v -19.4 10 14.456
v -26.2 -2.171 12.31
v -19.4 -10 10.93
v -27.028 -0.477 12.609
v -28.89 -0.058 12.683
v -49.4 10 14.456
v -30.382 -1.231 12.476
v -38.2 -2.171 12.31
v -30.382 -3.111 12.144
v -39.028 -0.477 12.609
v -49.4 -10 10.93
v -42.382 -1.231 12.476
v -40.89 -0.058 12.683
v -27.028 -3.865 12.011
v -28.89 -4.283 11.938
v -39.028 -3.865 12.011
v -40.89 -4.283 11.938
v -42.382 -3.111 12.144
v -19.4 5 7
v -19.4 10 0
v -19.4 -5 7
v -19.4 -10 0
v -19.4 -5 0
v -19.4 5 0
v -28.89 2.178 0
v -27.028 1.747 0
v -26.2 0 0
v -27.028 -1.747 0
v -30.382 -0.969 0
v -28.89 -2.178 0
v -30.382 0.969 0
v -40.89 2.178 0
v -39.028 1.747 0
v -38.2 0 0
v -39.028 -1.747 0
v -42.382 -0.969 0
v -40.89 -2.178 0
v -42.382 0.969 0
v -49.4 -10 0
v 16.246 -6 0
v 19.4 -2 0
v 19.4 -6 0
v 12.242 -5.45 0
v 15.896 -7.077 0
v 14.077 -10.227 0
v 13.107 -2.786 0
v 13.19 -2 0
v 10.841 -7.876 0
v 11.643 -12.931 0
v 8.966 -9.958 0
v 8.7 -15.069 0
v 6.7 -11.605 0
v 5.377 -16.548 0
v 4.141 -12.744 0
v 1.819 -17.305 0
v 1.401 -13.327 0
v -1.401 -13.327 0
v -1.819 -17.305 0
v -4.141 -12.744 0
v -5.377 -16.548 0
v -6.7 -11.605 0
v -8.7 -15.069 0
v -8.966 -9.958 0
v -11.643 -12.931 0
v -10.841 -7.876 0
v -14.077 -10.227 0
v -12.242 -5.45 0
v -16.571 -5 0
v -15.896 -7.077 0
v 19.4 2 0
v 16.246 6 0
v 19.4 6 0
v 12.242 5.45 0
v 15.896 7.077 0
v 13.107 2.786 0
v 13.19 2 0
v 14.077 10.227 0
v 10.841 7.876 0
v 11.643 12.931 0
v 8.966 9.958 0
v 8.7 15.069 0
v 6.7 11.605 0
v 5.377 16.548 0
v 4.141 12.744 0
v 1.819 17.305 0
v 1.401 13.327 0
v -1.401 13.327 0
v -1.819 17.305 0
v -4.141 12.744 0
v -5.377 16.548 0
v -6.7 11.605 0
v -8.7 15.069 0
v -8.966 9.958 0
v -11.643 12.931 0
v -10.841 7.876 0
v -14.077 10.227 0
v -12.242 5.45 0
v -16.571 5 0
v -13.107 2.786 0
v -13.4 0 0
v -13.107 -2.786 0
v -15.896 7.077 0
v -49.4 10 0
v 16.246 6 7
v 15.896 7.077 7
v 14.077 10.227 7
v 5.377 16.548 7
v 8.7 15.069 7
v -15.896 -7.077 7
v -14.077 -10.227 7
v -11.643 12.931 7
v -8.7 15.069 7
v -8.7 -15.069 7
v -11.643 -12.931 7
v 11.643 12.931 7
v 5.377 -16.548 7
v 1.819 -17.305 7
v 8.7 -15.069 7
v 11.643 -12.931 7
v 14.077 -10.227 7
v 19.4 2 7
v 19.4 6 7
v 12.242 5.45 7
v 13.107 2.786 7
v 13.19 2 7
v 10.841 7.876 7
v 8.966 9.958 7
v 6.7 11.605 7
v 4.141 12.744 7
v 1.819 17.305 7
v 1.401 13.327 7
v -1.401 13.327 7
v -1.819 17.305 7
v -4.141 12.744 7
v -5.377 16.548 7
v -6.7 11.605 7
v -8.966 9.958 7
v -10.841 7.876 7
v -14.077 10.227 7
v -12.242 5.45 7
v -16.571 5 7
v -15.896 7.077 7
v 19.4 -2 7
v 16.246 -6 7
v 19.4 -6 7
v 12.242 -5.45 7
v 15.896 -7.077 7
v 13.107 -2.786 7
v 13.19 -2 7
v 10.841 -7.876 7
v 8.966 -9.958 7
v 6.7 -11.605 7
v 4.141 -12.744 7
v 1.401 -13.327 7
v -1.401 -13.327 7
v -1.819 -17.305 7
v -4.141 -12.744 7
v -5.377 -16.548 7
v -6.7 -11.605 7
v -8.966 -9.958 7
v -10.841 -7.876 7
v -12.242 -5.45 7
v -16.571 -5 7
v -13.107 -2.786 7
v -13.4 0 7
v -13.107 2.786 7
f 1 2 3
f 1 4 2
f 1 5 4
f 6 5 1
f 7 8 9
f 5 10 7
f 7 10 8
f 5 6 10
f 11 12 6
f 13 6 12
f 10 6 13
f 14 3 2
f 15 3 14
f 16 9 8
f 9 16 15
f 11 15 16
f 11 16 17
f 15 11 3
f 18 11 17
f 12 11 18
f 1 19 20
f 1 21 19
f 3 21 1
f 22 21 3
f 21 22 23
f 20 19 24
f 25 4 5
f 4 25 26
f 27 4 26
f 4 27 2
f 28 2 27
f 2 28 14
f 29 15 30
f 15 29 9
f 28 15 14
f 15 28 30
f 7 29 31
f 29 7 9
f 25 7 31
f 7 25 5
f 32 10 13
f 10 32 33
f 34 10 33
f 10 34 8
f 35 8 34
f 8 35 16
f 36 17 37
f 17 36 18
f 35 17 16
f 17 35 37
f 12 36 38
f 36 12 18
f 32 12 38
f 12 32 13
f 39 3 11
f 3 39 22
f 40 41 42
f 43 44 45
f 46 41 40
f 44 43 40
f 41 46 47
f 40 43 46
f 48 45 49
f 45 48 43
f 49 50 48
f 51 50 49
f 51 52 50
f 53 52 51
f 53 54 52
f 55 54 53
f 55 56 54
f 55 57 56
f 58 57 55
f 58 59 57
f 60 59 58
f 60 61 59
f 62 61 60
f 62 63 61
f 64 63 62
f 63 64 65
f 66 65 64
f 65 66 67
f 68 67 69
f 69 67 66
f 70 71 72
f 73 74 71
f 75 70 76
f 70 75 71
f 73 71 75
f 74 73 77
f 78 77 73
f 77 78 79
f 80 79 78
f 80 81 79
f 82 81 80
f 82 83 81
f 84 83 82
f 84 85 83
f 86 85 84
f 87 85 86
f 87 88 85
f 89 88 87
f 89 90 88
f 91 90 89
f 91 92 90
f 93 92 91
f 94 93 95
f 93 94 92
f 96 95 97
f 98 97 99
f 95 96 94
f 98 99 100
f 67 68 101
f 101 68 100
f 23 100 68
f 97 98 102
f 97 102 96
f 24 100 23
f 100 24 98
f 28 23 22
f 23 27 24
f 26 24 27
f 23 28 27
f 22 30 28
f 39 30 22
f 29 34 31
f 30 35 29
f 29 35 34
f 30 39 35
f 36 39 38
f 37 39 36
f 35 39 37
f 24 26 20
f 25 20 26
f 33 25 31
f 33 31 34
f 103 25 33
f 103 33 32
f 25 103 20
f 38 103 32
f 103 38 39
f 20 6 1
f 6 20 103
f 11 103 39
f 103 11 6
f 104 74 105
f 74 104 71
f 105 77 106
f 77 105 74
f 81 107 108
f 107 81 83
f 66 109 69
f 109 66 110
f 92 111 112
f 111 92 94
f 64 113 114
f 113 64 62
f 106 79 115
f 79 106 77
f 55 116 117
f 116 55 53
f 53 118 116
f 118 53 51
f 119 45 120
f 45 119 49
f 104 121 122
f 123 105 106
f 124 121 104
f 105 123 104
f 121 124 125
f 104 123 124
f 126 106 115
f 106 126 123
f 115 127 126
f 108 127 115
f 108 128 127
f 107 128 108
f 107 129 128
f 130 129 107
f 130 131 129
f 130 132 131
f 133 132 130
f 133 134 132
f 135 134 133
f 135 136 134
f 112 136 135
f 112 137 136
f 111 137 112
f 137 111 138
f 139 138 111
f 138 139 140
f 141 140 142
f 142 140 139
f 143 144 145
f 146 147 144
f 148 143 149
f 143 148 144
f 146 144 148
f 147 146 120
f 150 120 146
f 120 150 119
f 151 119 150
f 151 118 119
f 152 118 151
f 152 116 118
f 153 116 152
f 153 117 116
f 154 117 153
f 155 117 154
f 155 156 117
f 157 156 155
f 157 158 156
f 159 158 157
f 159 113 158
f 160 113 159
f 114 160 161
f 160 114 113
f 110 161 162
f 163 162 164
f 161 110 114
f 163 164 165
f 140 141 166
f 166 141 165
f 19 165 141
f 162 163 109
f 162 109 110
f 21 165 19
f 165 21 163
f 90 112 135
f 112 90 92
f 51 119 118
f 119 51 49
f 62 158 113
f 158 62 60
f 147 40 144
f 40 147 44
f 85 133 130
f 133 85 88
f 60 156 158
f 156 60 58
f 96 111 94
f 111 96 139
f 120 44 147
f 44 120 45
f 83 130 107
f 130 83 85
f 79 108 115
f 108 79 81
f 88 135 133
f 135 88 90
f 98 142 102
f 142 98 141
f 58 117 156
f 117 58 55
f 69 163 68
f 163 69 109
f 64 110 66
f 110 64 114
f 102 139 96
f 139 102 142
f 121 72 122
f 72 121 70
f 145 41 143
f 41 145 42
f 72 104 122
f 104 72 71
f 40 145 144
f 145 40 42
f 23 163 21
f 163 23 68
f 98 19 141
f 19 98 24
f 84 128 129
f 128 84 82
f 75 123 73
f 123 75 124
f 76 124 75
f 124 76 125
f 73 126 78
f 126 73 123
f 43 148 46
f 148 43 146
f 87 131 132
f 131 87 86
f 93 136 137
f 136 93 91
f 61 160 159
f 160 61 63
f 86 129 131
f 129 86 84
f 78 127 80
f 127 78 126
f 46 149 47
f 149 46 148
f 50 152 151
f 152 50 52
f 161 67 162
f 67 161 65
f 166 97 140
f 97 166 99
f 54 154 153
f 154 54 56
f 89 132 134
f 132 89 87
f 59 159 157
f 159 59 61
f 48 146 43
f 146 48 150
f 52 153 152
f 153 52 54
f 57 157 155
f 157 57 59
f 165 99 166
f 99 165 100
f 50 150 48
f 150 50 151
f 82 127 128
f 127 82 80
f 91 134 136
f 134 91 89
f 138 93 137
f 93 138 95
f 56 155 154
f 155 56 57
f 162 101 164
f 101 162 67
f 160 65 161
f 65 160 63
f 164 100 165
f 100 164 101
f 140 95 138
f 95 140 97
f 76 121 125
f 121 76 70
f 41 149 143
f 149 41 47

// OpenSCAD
difference() {
	union() {
		cylinder(h=7,r=17.4);
		translate(v=[14.4,-6,0]) scale(v=[5,12,7]) cube();
		translate(v=[-14.4,-5,0]) scale(v=[-10,10,7]) cube();
		intersection() {
			translate(v=[-19.4,-10,0]) scale(v=[-30,20,20]) cube();
			rotate(a=10.0,v=[1,0,0]) {
				translate(v=[-34.4,0,0]) {
					difference() {
						scale(v=[-30,40,25]) {
							cube(center=true);
						}
						translate(v=[6,0,-5])
							cylinder(h=20,r=2.2);
						translate(v=[-6,0,-5])
							cylinder(h=20,r=2.2);
					}
				}
			}
		}
	}
	cylinder(h=7,r=13.4);
	translate(v=[12,-2,0]) scale(v=[16,4,7]) cube();
	
};
